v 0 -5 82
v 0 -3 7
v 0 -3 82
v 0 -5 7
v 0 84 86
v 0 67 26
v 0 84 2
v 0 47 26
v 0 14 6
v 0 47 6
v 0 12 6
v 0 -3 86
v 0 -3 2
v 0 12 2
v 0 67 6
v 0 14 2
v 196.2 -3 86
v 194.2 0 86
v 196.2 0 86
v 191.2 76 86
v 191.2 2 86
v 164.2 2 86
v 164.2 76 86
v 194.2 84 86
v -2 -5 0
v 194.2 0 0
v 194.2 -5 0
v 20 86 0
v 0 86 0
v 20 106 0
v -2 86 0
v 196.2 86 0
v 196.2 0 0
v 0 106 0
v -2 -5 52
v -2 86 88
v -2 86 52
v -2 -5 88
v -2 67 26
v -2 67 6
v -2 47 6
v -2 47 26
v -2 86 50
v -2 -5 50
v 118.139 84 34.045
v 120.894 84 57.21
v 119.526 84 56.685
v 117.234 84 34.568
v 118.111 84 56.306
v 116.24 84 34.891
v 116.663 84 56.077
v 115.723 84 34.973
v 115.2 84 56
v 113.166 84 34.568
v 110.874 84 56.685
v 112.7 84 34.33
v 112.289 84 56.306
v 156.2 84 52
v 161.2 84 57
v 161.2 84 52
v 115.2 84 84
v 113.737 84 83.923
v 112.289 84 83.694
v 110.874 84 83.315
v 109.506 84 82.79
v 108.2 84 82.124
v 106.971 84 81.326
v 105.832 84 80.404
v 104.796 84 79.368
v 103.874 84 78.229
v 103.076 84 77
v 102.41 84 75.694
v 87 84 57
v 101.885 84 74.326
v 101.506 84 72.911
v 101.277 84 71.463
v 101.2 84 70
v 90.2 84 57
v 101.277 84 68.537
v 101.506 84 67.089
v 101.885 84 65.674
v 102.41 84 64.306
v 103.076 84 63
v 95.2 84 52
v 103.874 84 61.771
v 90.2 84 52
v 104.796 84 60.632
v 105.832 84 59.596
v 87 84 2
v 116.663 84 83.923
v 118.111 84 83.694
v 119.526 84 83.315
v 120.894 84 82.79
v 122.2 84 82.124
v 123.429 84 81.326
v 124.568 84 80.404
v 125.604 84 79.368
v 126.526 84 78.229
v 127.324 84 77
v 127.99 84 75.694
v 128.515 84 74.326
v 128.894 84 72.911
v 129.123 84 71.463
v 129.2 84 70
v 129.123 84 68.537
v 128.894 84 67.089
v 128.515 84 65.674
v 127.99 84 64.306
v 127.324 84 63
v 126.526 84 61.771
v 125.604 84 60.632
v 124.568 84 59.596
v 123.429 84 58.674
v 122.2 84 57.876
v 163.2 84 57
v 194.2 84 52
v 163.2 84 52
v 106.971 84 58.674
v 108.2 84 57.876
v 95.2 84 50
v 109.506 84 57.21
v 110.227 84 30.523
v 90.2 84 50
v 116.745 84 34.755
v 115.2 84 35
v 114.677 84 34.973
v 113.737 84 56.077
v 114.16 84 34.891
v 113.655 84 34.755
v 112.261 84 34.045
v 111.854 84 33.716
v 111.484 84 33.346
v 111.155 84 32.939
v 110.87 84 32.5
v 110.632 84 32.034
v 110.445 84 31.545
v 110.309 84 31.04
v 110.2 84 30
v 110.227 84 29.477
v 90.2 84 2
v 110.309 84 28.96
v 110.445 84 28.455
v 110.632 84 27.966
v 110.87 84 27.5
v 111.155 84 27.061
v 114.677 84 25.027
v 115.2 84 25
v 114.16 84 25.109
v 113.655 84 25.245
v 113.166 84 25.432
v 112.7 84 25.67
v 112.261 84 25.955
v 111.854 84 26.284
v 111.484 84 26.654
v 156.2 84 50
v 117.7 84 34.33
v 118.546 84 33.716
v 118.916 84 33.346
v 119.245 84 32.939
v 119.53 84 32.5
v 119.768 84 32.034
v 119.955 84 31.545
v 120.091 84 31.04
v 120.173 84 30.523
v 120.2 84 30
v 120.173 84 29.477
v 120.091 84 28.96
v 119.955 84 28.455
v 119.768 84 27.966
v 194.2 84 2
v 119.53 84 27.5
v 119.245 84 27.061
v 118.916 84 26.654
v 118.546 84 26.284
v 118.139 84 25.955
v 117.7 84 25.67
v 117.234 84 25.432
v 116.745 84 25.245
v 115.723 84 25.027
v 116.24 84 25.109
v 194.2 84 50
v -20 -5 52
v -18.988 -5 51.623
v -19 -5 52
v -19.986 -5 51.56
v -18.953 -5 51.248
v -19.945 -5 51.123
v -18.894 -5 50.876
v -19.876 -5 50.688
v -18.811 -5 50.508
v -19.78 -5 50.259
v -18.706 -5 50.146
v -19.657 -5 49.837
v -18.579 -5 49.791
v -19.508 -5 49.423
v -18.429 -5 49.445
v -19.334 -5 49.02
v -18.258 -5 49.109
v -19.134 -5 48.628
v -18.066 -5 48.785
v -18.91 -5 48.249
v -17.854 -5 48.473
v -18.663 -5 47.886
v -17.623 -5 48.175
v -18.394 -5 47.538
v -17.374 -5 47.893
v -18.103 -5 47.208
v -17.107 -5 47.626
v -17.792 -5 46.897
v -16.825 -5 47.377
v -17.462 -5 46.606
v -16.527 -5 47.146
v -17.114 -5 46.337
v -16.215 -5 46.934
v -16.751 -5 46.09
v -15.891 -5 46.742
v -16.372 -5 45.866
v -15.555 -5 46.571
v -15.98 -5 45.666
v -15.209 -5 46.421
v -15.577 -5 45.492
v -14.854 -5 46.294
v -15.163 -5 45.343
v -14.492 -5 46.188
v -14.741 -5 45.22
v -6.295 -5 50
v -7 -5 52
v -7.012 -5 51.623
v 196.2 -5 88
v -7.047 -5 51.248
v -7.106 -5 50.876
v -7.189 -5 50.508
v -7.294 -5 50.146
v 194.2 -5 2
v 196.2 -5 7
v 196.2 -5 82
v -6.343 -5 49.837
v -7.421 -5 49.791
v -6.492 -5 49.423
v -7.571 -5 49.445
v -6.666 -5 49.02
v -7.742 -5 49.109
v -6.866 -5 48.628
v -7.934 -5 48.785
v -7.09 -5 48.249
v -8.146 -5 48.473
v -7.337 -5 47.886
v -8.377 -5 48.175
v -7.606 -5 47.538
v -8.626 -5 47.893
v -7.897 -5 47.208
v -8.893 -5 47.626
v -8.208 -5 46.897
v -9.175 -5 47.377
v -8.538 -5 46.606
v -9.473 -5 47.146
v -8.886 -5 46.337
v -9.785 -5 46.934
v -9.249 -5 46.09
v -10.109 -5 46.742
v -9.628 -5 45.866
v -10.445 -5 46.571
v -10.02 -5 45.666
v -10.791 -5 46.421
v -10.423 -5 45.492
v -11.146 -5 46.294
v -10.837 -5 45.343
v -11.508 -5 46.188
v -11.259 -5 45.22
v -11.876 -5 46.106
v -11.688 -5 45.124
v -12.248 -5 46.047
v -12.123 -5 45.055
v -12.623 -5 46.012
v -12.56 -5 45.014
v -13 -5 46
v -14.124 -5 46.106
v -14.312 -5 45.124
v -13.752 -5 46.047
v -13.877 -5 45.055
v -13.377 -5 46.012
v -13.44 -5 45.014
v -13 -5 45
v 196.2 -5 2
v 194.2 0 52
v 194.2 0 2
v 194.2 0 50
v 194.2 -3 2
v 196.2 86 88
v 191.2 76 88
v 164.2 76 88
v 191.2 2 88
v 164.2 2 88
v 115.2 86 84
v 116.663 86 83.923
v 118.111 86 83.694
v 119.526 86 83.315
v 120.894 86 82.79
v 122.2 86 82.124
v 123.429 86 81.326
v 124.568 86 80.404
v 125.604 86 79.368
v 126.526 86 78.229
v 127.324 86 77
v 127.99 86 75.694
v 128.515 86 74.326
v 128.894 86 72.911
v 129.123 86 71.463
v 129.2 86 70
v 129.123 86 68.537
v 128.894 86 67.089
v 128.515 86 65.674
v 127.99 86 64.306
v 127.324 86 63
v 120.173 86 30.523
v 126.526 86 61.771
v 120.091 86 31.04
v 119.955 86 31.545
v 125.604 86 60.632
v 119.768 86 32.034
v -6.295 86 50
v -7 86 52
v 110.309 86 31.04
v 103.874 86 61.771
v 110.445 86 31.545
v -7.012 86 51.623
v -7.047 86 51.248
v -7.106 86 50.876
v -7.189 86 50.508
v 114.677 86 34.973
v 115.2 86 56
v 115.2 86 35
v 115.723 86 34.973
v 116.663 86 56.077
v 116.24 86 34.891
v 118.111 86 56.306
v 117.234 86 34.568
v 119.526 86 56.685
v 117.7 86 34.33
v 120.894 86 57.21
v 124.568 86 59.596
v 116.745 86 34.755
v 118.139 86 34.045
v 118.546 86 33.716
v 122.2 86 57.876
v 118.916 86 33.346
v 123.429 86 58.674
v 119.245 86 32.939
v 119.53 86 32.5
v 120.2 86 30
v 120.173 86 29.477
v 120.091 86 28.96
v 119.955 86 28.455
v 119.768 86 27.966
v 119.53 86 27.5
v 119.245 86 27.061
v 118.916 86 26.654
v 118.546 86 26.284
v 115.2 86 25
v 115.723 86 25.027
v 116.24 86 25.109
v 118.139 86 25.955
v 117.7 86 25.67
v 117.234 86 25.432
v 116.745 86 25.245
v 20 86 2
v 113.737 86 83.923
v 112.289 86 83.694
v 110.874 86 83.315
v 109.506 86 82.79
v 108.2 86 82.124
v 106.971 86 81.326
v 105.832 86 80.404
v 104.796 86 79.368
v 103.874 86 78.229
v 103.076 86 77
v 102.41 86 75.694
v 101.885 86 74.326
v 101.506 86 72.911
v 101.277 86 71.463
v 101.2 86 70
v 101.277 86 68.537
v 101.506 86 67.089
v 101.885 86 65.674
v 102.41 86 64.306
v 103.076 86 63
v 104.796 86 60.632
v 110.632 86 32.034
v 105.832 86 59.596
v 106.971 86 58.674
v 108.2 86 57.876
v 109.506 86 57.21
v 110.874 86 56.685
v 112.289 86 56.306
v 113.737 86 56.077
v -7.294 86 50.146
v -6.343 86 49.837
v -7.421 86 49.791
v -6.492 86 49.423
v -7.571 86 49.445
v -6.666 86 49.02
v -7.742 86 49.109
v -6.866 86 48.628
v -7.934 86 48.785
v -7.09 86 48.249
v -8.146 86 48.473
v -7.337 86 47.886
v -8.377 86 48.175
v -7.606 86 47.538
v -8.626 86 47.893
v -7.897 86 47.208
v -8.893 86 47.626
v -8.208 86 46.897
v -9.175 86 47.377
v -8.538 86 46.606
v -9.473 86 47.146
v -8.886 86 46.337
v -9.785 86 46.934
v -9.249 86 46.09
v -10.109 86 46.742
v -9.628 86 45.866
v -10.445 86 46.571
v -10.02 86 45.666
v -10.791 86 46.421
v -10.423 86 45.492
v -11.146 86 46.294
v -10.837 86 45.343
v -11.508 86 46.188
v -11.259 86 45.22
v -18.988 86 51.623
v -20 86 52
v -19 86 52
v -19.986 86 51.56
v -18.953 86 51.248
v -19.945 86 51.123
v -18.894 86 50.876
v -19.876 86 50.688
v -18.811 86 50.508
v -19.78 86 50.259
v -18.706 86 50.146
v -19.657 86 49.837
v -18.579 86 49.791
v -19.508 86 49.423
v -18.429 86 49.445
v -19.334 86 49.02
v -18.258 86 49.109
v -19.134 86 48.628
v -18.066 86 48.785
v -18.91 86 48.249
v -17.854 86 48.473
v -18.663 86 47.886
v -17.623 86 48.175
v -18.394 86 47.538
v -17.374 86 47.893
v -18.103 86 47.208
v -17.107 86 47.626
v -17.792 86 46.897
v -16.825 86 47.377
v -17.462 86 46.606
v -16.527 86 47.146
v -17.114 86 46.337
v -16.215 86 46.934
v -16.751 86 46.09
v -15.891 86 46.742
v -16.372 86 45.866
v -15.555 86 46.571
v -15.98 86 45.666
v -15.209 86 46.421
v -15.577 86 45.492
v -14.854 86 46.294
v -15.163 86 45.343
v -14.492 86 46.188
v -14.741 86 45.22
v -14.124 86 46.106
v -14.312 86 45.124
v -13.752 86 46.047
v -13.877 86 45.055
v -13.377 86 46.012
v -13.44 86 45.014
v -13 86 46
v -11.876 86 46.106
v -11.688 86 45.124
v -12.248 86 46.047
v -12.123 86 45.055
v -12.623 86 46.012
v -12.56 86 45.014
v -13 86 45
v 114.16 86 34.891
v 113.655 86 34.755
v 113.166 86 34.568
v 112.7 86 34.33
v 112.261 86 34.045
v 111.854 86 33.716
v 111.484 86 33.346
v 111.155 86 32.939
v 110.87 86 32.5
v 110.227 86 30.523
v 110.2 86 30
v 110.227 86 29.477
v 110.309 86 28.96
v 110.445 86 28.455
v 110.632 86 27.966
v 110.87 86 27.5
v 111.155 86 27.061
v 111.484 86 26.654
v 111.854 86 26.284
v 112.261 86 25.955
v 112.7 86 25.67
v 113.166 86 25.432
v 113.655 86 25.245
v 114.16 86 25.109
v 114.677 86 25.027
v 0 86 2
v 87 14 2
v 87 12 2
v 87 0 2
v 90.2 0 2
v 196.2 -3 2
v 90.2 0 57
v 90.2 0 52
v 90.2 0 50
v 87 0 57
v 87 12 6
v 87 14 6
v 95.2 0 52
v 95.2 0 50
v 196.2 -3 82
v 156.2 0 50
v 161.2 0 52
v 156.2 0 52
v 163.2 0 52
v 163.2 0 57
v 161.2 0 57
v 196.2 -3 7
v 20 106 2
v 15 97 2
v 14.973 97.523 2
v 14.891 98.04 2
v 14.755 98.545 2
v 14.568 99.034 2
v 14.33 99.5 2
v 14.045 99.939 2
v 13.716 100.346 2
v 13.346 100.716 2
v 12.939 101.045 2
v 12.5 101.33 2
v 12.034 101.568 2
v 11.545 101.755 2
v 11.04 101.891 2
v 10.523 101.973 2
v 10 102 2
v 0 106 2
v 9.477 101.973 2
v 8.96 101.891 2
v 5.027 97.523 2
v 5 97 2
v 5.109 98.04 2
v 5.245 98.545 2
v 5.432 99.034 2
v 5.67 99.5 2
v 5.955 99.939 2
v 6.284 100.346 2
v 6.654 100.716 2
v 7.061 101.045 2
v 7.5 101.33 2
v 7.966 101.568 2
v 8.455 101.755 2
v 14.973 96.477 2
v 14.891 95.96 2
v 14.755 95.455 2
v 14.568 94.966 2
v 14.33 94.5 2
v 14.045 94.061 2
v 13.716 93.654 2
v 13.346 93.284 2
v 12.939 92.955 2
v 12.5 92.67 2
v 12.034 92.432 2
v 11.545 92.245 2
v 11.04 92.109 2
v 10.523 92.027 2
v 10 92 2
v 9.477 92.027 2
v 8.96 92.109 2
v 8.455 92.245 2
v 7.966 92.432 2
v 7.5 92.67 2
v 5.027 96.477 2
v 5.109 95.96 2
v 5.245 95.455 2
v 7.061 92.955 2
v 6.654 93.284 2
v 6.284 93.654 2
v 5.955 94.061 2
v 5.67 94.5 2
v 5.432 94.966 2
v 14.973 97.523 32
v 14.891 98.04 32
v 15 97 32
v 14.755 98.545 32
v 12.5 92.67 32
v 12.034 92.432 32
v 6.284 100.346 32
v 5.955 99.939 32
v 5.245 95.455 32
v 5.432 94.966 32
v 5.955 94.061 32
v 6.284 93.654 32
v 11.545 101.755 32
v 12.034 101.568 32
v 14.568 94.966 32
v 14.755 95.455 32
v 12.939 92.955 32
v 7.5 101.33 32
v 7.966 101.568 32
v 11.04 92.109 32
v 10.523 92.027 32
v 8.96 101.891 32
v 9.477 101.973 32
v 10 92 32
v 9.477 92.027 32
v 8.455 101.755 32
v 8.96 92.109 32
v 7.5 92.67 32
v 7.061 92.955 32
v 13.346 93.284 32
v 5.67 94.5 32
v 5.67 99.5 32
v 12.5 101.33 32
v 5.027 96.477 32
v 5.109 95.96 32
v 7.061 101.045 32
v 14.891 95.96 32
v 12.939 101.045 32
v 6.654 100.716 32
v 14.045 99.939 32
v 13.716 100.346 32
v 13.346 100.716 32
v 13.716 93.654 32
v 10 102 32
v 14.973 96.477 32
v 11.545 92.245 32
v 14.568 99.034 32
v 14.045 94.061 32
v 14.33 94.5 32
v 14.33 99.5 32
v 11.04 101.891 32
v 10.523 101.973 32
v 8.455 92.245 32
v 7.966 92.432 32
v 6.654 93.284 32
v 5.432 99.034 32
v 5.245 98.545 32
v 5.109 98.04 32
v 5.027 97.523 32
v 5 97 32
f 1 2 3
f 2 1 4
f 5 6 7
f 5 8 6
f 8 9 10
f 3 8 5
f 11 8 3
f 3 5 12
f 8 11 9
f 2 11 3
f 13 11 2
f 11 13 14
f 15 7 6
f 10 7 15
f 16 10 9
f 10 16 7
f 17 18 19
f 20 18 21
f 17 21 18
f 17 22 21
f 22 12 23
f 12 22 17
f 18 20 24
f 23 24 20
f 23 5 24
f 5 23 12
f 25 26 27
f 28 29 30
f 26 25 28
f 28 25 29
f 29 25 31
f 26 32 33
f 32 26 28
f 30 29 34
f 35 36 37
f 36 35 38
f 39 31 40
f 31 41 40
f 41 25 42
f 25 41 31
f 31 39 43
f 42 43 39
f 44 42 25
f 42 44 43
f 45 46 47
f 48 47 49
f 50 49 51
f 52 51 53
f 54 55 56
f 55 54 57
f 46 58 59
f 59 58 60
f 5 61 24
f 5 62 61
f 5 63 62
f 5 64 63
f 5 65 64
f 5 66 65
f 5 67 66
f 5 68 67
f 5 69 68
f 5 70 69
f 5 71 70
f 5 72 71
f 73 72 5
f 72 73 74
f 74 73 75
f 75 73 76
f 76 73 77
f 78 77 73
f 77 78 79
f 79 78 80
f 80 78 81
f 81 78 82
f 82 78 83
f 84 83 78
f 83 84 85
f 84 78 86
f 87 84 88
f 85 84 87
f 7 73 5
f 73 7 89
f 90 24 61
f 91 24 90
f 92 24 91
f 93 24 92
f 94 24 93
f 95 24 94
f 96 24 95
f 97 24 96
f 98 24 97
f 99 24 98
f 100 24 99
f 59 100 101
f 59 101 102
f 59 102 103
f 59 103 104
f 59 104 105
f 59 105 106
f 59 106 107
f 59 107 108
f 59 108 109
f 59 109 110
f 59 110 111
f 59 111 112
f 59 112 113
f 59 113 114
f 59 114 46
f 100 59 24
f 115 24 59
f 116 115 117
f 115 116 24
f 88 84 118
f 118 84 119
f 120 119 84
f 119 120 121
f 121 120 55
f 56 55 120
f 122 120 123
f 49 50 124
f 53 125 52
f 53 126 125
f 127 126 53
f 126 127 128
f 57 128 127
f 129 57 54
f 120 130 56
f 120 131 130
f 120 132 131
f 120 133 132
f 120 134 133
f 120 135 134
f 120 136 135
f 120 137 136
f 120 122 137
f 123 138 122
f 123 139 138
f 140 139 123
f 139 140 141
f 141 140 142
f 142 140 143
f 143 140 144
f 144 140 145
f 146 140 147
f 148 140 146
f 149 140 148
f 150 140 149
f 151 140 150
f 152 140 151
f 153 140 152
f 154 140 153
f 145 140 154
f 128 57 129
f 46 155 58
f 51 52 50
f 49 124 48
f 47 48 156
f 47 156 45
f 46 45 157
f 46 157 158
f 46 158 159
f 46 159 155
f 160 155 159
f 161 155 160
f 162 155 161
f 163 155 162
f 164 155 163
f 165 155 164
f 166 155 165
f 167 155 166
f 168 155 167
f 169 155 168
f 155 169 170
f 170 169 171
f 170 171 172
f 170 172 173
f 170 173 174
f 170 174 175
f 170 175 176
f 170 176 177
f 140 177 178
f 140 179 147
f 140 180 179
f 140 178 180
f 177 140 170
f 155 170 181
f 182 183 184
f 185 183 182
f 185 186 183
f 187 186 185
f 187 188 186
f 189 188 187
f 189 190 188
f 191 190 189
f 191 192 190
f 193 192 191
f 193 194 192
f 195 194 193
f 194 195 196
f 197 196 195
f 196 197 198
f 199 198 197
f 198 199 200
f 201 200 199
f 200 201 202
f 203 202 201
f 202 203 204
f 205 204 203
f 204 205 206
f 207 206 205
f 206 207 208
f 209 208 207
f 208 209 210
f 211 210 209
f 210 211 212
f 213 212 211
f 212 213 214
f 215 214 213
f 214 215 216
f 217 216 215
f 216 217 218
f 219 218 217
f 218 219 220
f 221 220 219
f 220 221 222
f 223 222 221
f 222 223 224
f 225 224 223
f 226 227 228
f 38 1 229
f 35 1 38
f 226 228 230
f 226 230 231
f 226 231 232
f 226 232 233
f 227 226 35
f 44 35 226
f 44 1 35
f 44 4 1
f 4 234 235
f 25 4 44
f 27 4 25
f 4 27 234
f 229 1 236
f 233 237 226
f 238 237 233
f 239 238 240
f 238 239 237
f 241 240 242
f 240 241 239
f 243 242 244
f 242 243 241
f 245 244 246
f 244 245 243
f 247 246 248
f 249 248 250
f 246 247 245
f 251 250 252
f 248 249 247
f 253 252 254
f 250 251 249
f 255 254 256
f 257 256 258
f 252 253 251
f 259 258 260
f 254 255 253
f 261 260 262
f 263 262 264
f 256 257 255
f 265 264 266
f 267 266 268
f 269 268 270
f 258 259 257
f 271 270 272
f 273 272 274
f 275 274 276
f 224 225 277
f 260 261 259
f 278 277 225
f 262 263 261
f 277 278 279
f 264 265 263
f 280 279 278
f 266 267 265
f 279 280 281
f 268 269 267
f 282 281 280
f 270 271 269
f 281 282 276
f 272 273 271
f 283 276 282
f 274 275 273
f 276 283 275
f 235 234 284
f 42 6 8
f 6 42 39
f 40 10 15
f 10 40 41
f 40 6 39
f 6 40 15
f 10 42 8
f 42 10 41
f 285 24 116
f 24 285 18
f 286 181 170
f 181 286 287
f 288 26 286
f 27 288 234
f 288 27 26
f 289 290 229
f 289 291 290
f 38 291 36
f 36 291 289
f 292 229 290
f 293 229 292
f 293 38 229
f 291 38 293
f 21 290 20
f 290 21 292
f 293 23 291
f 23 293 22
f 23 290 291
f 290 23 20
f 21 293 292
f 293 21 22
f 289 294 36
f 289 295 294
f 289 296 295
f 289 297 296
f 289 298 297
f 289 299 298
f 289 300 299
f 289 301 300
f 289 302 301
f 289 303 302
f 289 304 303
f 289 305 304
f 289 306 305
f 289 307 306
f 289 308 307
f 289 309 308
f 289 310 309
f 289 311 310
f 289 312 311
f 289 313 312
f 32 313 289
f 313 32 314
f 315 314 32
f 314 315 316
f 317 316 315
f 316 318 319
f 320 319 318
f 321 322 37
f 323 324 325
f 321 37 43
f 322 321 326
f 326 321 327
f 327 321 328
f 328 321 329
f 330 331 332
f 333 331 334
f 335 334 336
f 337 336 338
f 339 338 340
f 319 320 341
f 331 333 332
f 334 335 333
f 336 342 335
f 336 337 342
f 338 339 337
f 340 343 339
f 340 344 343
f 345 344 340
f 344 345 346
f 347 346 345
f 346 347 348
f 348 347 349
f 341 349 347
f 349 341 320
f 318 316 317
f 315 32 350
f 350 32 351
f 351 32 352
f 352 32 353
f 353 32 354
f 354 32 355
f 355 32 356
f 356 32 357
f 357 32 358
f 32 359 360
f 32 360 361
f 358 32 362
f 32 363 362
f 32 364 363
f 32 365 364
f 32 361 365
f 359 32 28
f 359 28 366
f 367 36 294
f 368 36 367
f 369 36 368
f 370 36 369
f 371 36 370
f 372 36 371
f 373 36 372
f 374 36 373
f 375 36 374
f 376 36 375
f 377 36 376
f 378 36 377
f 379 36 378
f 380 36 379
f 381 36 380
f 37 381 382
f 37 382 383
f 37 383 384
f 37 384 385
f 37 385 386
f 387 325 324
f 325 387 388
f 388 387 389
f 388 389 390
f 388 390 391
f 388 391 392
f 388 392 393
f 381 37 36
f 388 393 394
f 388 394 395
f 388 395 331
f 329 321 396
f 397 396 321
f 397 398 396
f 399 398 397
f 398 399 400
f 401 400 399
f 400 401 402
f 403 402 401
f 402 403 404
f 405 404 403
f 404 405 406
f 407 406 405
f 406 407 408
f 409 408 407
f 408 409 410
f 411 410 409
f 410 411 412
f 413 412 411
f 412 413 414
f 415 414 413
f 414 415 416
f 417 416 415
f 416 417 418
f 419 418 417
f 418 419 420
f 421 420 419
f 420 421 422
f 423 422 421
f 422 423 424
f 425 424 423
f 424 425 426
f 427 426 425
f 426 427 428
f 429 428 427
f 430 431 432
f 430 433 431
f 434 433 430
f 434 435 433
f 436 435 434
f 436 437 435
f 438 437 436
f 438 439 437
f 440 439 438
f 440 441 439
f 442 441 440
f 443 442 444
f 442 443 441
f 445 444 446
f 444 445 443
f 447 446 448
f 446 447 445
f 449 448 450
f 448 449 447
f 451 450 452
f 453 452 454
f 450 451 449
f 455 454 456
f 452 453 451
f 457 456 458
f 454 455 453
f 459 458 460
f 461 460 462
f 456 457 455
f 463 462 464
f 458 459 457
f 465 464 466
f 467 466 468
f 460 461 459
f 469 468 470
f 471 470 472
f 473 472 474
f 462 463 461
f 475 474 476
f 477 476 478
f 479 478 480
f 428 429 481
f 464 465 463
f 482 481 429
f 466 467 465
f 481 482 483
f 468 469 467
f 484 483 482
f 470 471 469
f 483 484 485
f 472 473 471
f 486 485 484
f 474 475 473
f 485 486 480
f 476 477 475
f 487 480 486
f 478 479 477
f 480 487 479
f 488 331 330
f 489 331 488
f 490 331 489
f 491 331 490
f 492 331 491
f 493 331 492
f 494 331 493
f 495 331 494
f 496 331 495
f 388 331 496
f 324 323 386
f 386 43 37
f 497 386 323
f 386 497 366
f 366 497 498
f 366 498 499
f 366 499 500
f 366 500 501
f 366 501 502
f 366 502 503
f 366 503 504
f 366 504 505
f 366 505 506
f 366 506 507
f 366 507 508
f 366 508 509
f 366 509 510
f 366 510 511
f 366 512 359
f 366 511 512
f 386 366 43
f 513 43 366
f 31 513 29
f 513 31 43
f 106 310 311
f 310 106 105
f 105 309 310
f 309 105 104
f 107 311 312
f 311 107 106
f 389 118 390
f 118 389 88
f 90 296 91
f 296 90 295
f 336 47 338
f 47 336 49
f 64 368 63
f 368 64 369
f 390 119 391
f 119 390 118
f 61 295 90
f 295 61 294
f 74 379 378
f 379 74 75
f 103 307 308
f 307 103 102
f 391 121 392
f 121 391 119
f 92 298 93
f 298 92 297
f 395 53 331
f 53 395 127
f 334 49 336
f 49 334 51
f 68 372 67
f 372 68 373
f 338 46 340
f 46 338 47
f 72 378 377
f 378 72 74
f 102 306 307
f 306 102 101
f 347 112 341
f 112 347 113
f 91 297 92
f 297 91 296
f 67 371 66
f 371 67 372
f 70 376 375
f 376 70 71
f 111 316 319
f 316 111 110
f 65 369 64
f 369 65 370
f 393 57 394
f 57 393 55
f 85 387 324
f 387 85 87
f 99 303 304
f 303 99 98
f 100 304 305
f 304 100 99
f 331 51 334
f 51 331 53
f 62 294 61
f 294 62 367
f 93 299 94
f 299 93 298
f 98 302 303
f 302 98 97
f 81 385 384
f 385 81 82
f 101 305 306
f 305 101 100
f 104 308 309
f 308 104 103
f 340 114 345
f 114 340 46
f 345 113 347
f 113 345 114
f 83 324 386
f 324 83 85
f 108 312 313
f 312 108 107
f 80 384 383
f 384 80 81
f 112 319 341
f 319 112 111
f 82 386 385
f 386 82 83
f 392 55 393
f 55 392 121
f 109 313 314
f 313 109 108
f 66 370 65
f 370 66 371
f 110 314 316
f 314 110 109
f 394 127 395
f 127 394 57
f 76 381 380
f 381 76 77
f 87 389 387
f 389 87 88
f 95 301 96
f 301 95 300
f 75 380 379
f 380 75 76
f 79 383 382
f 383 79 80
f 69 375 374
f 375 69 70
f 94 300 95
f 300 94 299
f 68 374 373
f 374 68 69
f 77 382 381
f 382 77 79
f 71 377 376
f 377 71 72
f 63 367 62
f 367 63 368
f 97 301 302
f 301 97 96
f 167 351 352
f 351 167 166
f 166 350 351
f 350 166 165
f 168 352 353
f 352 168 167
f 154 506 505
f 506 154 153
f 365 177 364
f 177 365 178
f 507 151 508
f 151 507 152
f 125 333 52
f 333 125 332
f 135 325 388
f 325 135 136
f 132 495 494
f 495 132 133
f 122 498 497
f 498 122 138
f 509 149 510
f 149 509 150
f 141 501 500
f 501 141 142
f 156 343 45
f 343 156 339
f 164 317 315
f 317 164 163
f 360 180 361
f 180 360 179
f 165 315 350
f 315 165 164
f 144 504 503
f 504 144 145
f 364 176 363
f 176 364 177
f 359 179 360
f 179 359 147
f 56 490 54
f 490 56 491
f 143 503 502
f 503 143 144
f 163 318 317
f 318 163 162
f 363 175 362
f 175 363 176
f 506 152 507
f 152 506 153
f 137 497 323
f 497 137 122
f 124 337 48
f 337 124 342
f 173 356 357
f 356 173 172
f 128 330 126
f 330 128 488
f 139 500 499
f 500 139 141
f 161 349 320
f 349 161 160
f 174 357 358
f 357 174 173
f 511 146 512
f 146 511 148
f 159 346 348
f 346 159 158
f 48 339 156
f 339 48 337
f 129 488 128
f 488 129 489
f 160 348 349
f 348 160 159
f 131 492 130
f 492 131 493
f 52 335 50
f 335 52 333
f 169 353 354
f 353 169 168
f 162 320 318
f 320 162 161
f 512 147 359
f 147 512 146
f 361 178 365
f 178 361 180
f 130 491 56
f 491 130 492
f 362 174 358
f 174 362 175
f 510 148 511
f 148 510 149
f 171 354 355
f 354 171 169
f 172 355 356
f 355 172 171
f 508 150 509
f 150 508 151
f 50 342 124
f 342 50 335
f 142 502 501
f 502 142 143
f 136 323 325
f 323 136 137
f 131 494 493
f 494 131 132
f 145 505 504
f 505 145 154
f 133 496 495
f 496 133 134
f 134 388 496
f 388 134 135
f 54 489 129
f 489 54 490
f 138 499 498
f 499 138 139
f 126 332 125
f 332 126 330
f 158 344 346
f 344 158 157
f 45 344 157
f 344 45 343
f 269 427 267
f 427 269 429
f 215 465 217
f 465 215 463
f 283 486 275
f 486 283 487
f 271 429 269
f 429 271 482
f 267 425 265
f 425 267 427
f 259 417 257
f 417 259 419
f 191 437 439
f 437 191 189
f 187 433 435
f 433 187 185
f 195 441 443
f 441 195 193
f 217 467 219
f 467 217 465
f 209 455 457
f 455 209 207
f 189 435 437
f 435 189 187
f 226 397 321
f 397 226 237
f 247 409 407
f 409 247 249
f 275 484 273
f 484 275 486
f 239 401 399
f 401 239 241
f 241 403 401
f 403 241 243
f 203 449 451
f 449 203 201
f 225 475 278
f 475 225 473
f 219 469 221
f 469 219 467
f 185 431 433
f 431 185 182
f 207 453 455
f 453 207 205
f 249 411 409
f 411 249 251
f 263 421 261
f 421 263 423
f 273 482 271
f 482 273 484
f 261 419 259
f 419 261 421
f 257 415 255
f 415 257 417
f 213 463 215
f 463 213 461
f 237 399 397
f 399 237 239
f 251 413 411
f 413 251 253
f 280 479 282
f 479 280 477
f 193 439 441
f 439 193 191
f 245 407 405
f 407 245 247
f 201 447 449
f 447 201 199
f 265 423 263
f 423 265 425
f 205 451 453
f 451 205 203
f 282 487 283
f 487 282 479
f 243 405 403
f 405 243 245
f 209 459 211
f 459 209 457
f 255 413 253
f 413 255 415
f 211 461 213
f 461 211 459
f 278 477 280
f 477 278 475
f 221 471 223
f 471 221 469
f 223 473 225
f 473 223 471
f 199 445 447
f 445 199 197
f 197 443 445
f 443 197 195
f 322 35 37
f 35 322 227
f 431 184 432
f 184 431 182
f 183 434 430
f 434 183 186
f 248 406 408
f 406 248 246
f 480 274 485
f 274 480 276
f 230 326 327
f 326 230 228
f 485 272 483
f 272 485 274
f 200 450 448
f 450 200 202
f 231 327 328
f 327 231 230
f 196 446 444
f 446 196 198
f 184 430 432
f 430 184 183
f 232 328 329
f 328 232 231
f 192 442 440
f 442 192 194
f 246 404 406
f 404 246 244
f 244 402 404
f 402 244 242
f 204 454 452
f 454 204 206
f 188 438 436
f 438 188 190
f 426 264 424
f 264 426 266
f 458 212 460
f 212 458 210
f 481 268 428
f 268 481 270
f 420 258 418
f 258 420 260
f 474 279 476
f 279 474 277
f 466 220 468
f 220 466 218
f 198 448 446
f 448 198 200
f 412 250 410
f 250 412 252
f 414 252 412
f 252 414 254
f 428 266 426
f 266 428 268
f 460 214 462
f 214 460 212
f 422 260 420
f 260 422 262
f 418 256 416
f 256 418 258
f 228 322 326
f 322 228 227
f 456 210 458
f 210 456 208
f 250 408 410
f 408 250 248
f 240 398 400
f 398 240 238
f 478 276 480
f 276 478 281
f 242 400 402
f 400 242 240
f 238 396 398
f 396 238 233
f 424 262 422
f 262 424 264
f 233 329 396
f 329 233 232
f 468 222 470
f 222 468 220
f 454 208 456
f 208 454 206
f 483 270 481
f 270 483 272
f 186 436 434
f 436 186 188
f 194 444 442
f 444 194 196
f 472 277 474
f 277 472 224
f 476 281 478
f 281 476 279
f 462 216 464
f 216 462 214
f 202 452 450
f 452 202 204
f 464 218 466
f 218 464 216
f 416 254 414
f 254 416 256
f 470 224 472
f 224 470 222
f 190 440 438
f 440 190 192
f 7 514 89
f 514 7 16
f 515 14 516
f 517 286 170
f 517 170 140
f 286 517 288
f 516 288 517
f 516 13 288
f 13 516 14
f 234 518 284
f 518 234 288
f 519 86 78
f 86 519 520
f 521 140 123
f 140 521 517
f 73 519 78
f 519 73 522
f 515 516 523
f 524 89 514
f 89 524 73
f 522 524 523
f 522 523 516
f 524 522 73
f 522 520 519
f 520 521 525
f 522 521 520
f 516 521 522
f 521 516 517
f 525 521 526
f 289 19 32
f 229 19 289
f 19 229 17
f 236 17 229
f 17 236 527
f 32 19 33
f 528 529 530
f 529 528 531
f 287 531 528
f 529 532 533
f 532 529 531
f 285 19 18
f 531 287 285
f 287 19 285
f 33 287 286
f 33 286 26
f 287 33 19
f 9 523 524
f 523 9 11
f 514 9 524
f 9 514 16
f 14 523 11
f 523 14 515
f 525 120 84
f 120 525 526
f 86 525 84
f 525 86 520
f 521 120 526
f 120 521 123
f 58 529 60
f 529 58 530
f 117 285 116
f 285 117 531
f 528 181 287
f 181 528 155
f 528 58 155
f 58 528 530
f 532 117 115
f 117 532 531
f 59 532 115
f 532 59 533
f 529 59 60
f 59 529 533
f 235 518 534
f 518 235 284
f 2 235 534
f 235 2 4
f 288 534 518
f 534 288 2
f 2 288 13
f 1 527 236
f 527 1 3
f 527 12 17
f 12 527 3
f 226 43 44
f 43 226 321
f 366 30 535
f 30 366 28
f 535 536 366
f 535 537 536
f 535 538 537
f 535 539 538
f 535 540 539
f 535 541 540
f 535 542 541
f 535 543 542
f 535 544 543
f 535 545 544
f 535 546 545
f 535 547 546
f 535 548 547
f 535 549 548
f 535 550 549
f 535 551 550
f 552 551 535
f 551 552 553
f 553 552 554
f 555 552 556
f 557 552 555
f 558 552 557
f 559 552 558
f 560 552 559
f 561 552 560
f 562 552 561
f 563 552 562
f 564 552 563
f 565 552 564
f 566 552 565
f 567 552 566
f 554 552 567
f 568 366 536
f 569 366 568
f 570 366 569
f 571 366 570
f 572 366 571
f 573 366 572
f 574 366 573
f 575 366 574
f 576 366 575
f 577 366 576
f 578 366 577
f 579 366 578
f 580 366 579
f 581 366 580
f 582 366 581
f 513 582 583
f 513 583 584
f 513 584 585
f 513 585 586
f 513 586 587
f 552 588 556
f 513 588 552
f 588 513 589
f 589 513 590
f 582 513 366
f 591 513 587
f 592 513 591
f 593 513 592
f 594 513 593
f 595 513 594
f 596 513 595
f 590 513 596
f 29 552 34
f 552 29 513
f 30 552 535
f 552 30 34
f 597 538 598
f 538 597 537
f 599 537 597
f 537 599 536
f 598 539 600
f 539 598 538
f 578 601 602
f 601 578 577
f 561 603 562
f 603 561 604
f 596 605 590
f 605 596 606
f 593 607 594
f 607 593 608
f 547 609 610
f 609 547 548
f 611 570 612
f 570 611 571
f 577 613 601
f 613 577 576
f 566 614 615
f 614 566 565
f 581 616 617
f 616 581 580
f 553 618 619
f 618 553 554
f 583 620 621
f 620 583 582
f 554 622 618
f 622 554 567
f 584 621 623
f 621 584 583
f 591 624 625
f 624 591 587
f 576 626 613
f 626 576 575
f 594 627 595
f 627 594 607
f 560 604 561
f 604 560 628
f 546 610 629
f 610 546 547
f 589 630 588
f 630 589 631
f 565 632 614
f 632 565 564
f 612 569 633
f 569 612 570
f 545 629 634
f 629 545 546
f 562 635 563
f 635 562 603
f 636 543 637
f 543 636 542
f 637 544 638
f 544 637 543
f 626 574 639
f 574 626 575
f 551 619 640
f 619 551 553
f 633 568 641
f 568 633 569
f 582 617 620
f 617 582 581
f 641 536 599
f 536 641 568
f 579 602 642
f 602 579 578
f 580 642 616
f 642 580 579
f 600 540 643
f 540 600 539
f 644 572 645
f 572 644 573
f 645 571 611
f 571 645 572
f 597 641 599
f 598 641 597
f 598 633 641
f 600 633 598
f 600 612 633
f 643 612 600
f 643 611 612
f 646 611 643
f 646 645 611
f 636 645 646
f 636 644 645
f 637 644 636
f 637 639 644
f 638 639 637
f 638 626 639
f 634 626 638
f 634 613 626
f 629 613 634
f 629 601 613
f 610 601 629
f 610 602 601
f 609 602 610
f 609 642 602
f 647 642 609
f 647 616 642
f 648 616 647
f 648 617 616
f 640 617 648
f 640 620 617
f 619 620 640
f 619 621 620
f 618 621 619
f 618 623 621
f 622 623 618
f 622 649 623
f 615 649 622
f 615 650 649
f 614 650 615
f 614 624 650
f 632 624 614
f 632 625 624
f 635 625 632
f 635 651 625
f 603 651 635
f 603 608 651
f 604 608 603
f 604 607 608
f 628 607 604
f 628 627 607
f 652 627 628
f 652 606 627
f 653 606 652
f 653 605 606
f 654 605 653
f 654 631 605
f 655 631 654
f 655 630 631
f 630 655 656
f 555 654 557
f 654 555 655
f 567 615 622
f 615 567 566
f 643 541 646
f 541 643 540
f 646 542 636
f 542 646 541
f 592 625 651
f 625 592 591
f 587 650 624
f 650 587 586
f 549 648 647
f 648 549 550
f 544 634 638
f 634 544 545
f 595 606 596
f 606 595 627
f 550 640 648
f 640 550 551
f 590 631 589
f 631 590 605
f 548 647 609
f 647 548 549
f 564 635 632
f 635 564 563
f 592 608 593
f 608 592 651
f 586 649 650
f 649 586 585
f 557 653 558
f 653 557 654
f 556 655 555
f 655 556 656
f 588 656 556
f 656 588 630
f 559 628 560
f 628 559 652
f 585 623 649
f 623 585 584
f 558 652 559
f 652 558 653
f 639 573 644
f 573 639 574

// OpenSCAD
translate([0, -5, 0])
cube([194.2, 89, 2]);

translate([87, 0, 2])
cube([3.2, 84, 55]);

translate([-2, -5, 0])
difference() {
    cube([2, 89, 86]);
    translate([-2, 52, 6])
    cube([6, 20, 20]);
}

translate([-2, -5, 86])
difference() {
    cube([196.2, 89, 2]);
    translate([166.2, 7, -2])
    cube([27, 74, 6]);
}

translate([-2, 84, 0])
difference() {
    cube([196.2, 2, 88]);

    translate([117.2, -2, 70])
    rotate([-90, 0, 0])
    cylinder(h = 6, d = 28, $fn = 60);

    translate([117.2, -2, 30])
    rotate([-90, 0, 0])
    cylinder(h = 6, d = 10, $fn = 60);
}

translate([194.2, 0, 0])
cube([2, 86, 88]);

translate([0, 12, 2])
cube([87, 2, 4]);

translate([90.2, 0, 50])
cube([5, 84, 2]);

translate([156.2, 0, 50])
cube([38, 84, 2]);

translate([161.2, 0, 52])
cube([2, 84, 5]);

translate([0, -5, 2])
cube([196.2, 2, 5]);

translate([0, -5, 82])
cube([196.2, 2, 4]);

translate([194.2, -5, 86])
cube([2, 5, 2]);

translate([-7, -5, 50])
cube([5, 91, 2]);

translate([-13, 86, 52])
rotate([90, 0, 0])
difference() {
    intersection() {
        cylinder(h = 91, d = 14, $fn = 100);
        translate([-7, -7, 0])
        cube([14, 7, 93]);
    }

    translate([0, 0, 0])
    cylinder(h = 93, d = 12, $fn = 100);
}
translate([0, 86, 0])
cube([20, 20, 2]);
translate([10, 97, 2])
cylinder(h= 30, d = 10, $fn=60);
